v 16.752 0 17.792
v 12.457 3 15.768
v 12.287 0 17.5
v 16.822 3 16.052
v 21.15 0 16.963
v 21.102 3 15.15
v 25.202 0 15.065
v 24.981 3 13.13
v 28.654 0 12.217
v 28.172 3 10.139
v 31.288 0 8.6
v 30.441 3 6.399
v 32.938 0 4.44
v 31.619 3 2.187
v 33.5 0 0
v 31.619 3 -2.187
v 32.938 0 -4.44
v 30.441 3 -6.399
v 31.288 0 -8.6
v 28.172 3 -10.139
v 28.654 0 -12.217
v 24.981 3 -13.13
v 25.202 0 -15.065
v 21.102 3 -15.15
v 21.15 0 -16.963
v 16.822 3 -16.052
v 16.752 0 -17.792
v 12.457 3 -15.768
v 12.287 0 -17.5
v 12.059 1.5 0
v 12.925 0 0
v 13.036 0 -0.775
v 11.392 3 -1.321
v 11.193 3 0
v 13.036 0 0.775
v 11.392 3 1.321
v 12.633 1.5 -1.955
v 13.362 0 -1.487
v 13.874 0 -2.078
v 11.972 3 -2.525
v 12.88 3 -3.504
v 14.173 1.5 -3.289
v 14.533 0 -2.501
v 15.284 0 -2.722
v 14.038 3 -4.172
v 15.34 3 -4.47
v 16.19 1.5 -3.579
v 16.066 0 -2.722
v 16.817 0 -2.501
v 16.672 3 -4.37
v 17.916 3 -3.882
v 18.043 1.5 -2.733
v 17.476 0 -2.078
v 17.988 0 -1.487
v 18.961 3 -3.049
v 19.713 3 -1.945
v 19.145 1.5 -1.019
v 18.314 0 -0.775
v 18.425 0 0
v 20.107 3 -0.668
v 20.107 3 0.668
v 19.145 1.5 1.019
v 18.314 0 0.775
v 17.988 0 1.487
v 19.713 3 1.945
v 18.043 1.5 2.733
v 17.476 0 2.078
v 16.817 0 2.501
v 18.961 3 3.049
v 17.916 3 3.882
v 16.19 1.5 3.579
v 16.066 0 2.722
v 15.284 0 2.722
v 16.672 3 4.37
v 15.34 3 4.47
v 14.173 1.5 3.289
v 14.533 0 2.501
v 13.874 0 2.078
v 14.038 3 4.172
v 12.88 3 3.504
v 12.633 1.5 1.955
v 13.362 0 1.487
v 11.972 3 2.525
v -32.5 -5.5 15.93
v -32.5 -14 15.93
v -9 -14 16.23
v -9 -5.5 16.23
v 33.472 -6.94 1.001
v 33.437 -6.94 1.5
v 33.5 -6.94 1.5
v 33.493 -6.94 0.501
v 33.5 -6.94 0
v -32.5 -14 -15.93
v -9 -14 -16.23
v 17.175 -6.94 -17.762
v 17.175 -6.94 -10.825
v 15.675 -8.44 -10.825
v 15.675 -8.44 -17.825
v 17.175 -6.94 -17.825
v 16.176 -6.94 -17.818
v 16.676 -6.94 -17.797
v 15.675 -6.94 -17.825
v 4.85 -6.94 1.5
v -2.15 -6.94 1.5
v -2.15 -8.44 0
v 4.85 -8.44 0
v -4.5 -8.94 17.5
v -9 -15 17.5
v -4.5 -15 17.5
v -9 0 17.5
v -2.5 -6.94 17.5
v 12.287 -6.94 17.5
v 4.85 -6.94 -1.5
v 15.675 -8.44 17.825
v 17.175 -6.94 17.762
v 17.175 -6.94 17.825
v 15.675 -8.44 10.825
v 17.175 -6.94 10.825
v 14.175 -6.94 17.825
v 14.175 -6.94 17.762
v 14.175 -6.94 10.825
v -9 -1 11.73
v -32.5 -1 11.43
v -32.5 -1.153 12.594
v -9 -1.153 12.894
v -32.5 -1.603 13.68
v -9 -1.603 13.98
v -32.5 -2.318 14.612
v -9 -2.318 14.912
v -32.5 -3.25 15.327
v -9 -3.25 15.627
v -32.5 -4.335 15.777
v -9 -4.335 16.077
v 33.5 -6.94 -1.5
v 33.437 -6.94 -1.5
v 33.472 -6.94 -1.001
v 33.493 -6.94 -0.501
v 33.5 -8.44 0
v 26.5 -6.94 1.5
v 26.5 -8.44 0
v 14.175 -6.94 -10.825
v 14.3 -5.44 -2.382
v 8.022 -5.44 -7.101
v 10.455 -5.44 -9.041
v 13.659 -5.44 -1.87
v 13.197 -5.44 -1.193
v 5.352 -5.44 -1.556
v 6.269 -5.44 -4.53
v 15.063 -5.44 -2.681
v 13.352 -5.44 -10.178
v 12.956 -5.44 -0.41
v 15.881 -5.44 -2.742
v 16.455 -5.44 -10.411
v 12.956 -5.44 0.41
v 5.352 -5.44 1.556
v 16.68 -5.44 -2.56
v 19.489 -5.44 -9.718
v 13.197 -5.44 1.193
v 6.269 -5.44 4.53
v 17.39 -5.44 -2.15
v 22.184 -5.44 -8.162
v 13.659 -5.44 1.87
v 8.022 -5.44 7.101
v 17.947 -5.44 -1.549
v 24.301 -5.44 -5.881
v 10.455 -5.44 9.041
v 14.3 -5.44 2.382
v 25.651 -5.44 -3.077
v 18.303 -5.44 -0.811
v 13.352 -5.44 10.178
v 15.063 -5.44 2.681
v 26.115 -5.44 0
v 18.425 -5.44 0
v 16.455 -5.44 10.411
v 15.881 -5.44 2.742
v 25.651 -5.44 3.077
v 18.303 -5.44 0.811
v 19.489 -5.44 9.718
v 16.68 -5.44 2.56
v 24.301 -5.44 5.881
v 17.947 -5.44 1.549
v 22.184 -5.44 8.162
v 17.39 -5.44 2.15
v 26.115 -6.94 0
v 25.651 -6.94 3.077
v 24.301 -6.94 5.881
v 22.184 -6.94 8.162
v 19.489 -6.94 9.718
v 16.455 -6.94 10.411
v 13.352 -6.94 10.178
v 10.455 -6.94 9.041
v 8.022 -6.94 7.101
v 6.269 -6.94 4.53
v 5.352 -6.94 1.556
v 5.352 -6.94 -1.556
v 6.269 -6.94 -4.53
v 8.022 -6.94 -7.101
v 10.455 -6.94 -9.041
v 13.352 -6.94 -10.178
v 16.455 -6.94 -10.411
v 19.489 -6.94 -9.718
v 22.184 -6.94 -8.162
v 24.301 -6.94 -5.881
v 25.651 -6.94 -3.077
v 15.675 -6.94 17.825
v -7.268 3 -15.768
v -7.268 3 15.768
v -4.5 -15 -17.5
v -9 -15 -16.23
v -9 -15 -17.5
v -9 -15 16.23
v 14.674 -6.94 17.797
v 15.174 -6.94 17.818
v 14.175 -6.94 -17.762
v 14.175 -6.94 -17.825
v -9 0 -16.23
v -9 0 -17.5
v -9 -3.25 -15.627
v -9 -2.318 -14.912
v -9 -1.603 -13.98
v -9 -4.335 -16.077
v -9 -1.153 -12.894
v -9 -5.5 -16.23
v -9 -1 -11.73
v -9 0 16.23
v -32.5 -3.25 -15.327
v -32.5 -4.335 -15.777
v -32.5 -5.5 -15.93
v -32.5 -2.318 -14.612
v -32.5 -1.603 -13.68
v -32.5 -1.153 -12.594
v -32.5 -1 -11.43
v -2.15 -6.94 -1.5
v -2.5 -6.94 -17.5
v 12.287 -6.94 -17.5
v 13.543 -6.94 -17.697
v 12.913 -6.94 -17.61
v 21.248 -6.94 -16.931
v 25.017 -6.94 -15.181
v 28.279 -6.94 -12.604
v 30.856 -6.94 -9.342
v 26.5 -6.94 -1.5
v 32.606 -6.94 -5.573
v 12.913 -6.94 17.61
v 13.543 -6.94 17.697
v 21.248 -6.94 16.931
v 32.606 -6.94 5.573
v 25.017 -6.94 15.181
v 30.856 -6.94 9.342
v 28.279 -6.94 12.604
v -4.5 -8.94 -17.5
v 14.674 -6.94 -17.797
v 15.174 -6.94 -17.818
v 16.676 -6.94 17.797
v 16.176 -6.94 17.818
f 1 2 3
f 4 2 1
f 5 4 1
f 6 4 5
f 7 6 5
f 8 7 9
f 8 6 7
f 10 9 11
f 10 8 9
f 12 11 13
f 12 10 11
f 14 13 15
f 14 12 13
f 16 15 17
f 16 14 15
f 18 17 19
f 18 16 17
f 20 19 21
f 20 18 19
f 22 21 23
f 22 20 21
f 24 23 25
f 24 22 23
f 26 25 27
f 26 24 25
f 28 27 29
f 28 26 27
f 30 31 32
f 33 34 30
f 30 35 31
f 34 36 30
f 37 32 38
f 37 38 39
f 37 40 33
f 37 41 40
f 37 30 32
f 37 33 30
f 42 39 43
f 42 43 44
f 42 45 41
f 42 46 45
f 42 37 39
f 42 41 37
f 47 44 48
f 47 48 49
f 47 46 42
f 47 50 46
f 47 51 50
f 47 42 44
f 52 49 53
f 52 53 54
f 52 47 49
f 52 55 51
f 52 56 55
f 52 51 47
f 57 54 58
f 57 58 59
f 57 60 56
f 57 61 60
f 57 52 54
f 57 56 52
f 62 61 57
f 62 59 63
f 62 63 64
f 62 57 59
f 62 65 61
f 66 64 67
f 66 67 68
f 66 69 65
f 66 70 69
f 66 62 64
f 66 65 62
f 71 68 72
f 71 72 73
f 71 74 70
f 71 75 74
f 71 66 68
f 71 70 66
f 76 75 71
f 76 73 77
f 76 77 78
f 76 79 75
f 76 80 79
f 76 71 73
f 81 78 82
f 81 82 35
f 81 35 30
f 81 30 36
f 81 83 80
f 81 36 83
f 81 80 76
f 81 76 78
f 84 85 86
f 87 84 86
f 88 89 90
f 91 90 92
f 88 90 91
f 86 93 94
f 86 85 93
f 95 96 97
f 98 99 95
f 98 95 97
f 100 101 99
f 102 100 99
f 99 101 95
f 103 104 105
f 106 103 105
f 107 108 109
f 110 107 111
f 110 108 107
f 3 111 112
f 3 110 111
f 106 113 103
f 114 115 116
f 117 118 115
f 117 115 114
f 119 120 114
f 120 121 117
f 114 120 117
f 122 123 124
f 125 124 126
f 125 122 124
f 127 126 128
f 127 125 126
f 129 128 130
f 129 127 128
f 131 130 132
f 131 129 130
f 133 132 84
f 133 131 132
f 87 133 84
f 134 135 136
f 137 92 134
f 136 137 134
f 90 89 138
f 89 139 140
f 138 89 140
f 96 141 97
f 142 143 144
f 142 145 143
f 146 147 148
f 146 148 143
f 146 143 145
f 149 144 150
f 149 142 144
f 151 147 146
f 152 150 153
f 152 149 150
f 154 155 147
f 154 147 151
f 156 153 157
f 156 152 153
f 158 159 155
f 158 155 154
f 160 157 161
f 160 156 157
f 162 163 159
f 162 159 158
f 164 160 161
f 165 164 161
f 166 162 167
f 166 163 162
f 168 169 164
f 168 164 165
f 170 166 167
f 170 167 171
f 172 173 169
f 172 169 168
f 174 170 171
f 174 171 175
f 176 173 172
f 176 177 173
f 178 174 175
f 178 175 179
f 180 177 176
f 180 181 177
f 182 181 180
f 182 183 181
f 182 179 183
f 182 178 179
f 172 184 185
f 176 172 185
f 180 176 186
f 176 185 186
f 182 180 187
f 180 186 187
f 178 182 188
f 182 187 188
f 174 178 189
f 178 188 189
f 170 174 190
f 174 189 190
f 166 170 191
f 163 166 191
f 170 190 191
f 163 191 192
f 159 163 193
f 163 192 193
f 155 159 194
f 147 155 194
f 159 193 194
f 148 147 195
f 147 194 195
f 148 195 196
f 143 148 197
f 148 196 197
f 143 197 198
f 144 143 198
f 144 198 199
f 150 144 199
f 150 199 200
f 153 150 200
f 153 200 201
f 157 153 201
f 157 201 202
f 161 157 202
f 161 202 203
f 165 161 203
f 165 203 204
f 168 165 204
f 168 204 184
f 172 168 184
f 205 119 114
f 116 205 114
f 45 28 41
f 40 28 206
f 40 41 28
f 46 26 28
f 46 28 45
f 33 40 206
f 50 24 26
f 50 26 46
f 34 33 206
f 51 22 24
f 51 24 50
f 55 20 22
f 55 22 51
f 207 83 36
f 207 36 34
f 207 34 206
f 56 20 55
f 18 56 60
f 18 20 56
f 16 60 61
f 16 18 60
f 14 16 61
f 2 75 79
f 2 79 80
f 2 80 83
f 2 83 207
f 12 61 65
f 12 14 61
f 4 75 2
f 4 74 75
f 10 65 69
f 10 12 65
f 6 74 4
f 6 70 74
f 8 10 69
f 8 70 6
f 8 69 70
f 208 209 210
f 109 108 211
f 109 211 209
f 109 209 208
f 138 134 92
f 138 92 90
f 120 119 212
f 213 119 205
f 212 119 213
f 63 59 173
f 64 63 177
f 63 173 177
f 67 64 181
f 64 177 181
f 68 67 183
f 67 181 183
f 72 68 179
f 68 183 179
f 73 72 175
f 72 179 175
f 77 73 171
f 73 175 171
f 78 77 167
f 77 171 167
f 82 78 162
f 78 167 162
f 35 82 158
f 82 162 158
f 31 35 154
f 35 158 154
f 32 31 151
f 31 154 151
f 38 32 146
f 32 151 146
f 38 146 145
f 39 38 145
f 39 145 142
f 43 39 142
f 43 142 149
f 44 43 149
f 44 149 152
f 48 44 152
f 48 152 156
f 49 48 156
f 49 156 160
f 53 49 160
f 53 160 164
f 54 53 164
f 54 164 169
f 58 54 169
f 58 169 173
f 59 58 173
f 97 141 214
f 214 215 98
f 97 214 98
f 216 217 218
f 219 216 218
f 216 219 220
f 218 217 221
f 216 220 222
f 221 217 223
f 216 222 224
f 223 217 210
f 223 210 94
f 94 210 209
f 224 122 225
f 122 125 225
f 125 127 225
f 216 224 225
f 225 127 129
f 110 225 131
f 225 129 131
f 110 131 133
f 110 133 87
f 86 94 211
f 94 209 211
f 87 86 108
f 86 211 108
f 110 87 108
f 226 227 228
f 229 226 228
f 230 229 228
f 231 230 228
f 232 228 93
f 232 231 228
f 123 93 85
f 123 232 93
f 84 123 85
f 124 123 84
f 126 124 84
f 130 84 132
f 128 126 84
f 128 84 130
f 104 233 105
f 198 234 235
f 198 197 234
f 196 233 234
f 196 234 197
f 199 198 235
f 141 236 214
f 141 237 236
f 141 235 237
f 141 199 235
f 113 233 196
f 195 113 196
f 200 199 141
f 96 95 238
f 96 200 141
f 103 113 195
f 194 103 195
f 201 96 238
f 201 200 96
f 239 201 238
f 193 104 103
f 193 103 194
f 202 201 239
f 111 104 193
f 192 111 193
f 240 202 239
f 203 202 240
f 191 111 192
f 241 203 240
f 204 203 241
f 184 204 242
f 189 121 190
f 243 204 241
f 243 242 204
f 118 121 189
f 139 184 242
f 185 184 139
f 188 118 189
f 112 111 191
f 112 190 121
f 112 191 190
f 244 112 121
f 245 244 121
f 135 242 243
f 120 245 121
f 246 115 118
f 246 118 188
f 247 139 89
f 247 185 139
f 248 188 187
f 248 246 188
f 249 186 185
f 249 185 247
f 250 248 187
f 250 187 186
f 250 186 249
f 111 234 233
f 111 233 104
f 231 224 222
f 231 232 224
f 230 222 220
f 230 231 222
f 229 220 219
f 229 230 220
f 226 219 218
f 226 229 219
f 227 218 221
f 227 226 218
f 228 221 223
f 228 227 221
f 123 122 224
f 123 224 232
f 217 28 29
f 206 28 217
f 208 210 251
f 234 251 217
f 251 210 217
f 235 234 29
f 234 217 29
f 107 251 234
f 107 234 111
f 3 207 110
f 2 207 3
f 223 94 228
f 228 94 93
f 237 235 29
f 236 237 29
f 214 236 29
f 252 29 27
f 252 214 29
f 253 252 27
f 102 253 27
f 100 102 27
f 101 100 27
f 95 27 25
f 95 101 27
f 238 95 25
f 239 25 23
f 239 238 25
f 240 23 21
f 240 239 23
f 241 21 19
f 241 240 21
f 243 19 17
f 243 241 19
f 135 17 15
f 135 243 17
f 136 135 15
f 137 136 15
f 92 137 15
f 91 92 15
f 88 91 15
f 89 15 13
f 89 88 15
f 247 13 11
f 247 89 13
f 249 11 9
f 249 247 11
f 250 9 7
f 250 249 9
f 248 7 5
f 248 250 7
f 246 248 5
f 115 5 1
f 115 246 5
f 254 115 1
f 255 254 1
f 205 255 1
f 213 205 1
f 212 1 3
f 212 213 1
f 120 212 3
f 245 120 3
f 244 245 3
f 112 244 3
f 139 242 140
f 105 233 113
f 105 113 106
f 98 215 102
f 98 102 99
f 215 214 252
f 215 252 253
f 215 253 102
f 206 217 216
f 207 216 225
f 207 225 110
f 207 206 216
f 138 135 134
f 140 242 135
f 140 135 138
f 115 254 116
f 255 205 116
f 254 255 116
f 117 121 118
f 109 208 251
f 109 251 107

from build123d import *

# Parameters (mm, degrees)
F0_W         = 65
F0_H         = 35
F1_DEPTH     = 15
F2_R         = 17.825
F3_DEPTH     = 15
F4_W         = 39
F4_H         = 37.65
F5_DEPTH     = 8.06
F7_DEPTH     = 15.001
F8_W         = 30.8607626557
F8_H         = 37.5567990541
F9_DEPTH     = 1
F10_W        = 25.4967134297
F10_H        = 35
F11_DEPTH    = 1
F12_SIZE     = 2
F13_R        = 2.75
F14_DEPTH    = 6.941
F15_R        = 10.44
F16_DEPTH    = 1.5
F17_R        = 4.5
F19_DEPTH    = 25
F20_W        = 7
F20_H        = 3
F20_W_2      = 3
F20_H_2      = 7
F21_DEPTH    = 1.7
F22_T1_DEPTH = 15.7437221591
F22_T3_DEPTH = 15.7437221591
F22_T5_DEPTH = 11.3718610795
F22_T7_DEPTH = 15.7437221591
F3_FACE1_R   = 2.75
F23_DEPTH    = 3
F23_TAPER    = 30


# Not quite as in the source:
# - a fillet or chamfer that OpenCascade refuses, or shapes differently, is made with other operations: its cross-section is extruded or revolved along the edge and cut away or added


with BuildPart() as f1:
    # F0 (on Front) → F1 (new body)
    with BuildSketch(Plane.XZ):
        Rectangle(F0_W, F0_H)
    extrude(amount=F1_DEPTH)

    # F2 (on face) → F3 (join, through all)
    with BuildSketch(Plane.XZ.offset(15)):
        with Locations((15.675, 0)):
            Circle(F2_R)
    extrude(amount=-F3_DEPTH)

    # F4 (on face) → F5 (cut)
    with BuildSketch(Plane.XZ.offset(15)):
        with Locations((15, 0)):
            Rectangle(F4_W, F4_H)
    extrude(amount=-F5_DEPTH, mode=Mode.SUBTRACT)

    # F6 (on face) → F7 (cut, through all)
    with BuildSketch(Plane.XZ.offset(15)):
        Polygon((-9, 16.23), (-9, 17.5), (-32.5, 17.5), (-32.5, 15.93), align=None)
        Polygon((-32.5, -17.5), (-9, -17.5), (-9, -16.23), (-32.5, -15.93), align=None)
    extrude(amount=-F7_DEPTH, mode=Mode.SUBTRACT)

    # F8 (on face) → F9 (cut)
    with BuildSketch(Plane.XZ.offset(15)):
        with Locations((-24.4303813279, 1.2783995271)):
            Rectangle(F8_W, F8_H)
    extrude(amount=-F9_DEPTH, mode=Mode.SUBTRACT)

    # F10 (on face) → F11 (cut)
    with BuildSketch(Plane(origin=(0, 0, 0), x_dir=(-1, 0, 0), z_dir=(0, 1, 0))):
        with Locations((21.7483567148, 0)):
            Rectangle(F10_W, F10_H)
    extrude(amount=-F11_DEPTH, mode=Mode.SUBTRACT)

    # F12
    f12_edges = [f1.edges().sort_by_distance(p)[0] for p in [
        (-4.5, -6.94, 0),
    ]]
    chamfer(f12_edges, length=F12_SIZE)

    # F13 (on face) → F14 (cut, through all)
    with BuildSketch(Plane.XZ.offset(6.94)):
        with Locations((15.675, 0)):
            Circle(F13_R)
    extrude(amount=-F14_DEPTH, mode=Mode.SUBTRACT)

    # F15 (on face) → F16 (cut)
    with BuildSketch(Plane.XZ.offset(6.94)):
        with Locations((15.675, 0)):
            Circle(F15_R)
    extrude(amount=-F16_DEPTH, mode=Mode.SUBTRACT)

    # F17
    f17_edges = [f1.edges().sort_by_distance(p)[0] for p in [
        (-20.75, -1, 16.08),
        (-20.75, -1, -16.08),
    ]]
    fillet(f17_edges, radius=F17_R)

    # F18 (on face) → F19 (cut)
    with BuildSketch(Plane.XZ.offset(6.94)):
        with BuildLine():
            ThreePointArc((15.675, 17.825), (33.5, 0), (15.675, -17.825))
            Line((15.675, -17.825), (14.3514294177, -24.9375402927))
            Line((14.3514294177, -24.9375402927), (39.8063696921, -24.9375402927))
            Line((39.8063696921, -24.9375402927), (43.452385813, 22.5534923375))
            Line((43.452385813, 22.5534923375), (15.675, 27.0696729422))
            Line((15.675, 27.0696729422), (15.675, 17.825))
        make_face()
    extrude(amount=-F19_DEPTH, mode=Mode.SUBTRACT)

    # F20 (on face) → F21 (join)
    with BuildSketch(Plane.XZ.offset(6.94)):
        with Locations((30, 0)):
            Rectangle(F20_W, F20_H)
        with Locations((15.675, 14.325)):
            Rectangle(F20_W_2, F20_H_2)
        with Locations((1.35, 0)):
            Rectangle(F20_W, F20_H)
        with Locations((15.675, -14.325)):
            Rectangle(F20_W_2, F20_H_2)
    extrude(amount=F21_DEPTH)

    # F22: chamfer of 1.7 on 8 edges, made by hand

    # F22_s2 → F22_t1 (cut)
    with BuildSketch(Plane.YZ.offset(22.1281389205)):
        Polygon((-6.94, 1.5), (-8.64, -0.2), (-8.64, 1.5), align=None)
        Polygon((-6.94, -1.5), (-8.64, 0.2), (-8.64, -1.5), align=None)
    extrude(amount=F22_T1_DEPTH, mode=Mode.SUBTRACT)

    # F22_s4 → F22_t3 (cut)
    with BuildSketch(Plane.XY.offset(-22.1968610795)):
        Polygon((17.175, -6.94), (15.475, -8.64), (17.175, -8.64), align=None)
        Polygon((14.175, -6.94), (15.875, -8.64), (14.175, -8.64), align=None)
    extrude(amount=F22_T3_DEPTH, mode=Mode.SUBTRACT)

    # F22_s6 → F22_t5 (cut)
    with BuildSketch(Plane.YZ.offset(-2.15)):
        Polygon((-6.94, -1.5), (-8.64, 0.2), (-8.64, -1.5), align=None)
        Polygon((-6.94, 1.5), (-8.64, -0.2), (-8.64, 1.5), align=None)
    extrude(amount=F22_T5_DEPTH, mode=Mode.SUBTRACT)

    # F22_s8 → F22_t7 (cut)
    with BuildSketch(Plane.XY.offset(6.4531389205)):
        Polygon((14.175, -6.94), (15.875, -8.64), (14.175, -8.64), align=None)
        Polygon((17.175, -6.94), (15.475, -8.64), (17.175, -8.64), align=None)
    extrude(amount=F22_T7_DEPTH, mode=Mode.SUBTRACT)

    # F3_face1 (on face) → F23 (join)
    with BuildSketch(Plane(origin=(0.7743209172, 0, 0), x_dir=(-1, 0, 0), z_dir=(0, 1, 0))):
        with BuildLine():
            Line((-11.5123719834, -17.5), (9.7743209172, -17.5))
            Line((9.7743209172, -17.5), (9.7743209172, 17.5))
            Line((9.7743209172, 17.5), (-11.5123719834, 17.5))
            ThreePointArc((-11.5123719834, 17.5), (-32.7256790828, 0), (-11.5123719834, -17.5))
        make_face()
        with Locations((-14.9006790828, 0)):
            Circle(F3_FACE1_R, mode=Mode.SUBTRACT)
    extrude(amount=F23_DEPTH, taper=F23_TAPER)


solid = f1.part
